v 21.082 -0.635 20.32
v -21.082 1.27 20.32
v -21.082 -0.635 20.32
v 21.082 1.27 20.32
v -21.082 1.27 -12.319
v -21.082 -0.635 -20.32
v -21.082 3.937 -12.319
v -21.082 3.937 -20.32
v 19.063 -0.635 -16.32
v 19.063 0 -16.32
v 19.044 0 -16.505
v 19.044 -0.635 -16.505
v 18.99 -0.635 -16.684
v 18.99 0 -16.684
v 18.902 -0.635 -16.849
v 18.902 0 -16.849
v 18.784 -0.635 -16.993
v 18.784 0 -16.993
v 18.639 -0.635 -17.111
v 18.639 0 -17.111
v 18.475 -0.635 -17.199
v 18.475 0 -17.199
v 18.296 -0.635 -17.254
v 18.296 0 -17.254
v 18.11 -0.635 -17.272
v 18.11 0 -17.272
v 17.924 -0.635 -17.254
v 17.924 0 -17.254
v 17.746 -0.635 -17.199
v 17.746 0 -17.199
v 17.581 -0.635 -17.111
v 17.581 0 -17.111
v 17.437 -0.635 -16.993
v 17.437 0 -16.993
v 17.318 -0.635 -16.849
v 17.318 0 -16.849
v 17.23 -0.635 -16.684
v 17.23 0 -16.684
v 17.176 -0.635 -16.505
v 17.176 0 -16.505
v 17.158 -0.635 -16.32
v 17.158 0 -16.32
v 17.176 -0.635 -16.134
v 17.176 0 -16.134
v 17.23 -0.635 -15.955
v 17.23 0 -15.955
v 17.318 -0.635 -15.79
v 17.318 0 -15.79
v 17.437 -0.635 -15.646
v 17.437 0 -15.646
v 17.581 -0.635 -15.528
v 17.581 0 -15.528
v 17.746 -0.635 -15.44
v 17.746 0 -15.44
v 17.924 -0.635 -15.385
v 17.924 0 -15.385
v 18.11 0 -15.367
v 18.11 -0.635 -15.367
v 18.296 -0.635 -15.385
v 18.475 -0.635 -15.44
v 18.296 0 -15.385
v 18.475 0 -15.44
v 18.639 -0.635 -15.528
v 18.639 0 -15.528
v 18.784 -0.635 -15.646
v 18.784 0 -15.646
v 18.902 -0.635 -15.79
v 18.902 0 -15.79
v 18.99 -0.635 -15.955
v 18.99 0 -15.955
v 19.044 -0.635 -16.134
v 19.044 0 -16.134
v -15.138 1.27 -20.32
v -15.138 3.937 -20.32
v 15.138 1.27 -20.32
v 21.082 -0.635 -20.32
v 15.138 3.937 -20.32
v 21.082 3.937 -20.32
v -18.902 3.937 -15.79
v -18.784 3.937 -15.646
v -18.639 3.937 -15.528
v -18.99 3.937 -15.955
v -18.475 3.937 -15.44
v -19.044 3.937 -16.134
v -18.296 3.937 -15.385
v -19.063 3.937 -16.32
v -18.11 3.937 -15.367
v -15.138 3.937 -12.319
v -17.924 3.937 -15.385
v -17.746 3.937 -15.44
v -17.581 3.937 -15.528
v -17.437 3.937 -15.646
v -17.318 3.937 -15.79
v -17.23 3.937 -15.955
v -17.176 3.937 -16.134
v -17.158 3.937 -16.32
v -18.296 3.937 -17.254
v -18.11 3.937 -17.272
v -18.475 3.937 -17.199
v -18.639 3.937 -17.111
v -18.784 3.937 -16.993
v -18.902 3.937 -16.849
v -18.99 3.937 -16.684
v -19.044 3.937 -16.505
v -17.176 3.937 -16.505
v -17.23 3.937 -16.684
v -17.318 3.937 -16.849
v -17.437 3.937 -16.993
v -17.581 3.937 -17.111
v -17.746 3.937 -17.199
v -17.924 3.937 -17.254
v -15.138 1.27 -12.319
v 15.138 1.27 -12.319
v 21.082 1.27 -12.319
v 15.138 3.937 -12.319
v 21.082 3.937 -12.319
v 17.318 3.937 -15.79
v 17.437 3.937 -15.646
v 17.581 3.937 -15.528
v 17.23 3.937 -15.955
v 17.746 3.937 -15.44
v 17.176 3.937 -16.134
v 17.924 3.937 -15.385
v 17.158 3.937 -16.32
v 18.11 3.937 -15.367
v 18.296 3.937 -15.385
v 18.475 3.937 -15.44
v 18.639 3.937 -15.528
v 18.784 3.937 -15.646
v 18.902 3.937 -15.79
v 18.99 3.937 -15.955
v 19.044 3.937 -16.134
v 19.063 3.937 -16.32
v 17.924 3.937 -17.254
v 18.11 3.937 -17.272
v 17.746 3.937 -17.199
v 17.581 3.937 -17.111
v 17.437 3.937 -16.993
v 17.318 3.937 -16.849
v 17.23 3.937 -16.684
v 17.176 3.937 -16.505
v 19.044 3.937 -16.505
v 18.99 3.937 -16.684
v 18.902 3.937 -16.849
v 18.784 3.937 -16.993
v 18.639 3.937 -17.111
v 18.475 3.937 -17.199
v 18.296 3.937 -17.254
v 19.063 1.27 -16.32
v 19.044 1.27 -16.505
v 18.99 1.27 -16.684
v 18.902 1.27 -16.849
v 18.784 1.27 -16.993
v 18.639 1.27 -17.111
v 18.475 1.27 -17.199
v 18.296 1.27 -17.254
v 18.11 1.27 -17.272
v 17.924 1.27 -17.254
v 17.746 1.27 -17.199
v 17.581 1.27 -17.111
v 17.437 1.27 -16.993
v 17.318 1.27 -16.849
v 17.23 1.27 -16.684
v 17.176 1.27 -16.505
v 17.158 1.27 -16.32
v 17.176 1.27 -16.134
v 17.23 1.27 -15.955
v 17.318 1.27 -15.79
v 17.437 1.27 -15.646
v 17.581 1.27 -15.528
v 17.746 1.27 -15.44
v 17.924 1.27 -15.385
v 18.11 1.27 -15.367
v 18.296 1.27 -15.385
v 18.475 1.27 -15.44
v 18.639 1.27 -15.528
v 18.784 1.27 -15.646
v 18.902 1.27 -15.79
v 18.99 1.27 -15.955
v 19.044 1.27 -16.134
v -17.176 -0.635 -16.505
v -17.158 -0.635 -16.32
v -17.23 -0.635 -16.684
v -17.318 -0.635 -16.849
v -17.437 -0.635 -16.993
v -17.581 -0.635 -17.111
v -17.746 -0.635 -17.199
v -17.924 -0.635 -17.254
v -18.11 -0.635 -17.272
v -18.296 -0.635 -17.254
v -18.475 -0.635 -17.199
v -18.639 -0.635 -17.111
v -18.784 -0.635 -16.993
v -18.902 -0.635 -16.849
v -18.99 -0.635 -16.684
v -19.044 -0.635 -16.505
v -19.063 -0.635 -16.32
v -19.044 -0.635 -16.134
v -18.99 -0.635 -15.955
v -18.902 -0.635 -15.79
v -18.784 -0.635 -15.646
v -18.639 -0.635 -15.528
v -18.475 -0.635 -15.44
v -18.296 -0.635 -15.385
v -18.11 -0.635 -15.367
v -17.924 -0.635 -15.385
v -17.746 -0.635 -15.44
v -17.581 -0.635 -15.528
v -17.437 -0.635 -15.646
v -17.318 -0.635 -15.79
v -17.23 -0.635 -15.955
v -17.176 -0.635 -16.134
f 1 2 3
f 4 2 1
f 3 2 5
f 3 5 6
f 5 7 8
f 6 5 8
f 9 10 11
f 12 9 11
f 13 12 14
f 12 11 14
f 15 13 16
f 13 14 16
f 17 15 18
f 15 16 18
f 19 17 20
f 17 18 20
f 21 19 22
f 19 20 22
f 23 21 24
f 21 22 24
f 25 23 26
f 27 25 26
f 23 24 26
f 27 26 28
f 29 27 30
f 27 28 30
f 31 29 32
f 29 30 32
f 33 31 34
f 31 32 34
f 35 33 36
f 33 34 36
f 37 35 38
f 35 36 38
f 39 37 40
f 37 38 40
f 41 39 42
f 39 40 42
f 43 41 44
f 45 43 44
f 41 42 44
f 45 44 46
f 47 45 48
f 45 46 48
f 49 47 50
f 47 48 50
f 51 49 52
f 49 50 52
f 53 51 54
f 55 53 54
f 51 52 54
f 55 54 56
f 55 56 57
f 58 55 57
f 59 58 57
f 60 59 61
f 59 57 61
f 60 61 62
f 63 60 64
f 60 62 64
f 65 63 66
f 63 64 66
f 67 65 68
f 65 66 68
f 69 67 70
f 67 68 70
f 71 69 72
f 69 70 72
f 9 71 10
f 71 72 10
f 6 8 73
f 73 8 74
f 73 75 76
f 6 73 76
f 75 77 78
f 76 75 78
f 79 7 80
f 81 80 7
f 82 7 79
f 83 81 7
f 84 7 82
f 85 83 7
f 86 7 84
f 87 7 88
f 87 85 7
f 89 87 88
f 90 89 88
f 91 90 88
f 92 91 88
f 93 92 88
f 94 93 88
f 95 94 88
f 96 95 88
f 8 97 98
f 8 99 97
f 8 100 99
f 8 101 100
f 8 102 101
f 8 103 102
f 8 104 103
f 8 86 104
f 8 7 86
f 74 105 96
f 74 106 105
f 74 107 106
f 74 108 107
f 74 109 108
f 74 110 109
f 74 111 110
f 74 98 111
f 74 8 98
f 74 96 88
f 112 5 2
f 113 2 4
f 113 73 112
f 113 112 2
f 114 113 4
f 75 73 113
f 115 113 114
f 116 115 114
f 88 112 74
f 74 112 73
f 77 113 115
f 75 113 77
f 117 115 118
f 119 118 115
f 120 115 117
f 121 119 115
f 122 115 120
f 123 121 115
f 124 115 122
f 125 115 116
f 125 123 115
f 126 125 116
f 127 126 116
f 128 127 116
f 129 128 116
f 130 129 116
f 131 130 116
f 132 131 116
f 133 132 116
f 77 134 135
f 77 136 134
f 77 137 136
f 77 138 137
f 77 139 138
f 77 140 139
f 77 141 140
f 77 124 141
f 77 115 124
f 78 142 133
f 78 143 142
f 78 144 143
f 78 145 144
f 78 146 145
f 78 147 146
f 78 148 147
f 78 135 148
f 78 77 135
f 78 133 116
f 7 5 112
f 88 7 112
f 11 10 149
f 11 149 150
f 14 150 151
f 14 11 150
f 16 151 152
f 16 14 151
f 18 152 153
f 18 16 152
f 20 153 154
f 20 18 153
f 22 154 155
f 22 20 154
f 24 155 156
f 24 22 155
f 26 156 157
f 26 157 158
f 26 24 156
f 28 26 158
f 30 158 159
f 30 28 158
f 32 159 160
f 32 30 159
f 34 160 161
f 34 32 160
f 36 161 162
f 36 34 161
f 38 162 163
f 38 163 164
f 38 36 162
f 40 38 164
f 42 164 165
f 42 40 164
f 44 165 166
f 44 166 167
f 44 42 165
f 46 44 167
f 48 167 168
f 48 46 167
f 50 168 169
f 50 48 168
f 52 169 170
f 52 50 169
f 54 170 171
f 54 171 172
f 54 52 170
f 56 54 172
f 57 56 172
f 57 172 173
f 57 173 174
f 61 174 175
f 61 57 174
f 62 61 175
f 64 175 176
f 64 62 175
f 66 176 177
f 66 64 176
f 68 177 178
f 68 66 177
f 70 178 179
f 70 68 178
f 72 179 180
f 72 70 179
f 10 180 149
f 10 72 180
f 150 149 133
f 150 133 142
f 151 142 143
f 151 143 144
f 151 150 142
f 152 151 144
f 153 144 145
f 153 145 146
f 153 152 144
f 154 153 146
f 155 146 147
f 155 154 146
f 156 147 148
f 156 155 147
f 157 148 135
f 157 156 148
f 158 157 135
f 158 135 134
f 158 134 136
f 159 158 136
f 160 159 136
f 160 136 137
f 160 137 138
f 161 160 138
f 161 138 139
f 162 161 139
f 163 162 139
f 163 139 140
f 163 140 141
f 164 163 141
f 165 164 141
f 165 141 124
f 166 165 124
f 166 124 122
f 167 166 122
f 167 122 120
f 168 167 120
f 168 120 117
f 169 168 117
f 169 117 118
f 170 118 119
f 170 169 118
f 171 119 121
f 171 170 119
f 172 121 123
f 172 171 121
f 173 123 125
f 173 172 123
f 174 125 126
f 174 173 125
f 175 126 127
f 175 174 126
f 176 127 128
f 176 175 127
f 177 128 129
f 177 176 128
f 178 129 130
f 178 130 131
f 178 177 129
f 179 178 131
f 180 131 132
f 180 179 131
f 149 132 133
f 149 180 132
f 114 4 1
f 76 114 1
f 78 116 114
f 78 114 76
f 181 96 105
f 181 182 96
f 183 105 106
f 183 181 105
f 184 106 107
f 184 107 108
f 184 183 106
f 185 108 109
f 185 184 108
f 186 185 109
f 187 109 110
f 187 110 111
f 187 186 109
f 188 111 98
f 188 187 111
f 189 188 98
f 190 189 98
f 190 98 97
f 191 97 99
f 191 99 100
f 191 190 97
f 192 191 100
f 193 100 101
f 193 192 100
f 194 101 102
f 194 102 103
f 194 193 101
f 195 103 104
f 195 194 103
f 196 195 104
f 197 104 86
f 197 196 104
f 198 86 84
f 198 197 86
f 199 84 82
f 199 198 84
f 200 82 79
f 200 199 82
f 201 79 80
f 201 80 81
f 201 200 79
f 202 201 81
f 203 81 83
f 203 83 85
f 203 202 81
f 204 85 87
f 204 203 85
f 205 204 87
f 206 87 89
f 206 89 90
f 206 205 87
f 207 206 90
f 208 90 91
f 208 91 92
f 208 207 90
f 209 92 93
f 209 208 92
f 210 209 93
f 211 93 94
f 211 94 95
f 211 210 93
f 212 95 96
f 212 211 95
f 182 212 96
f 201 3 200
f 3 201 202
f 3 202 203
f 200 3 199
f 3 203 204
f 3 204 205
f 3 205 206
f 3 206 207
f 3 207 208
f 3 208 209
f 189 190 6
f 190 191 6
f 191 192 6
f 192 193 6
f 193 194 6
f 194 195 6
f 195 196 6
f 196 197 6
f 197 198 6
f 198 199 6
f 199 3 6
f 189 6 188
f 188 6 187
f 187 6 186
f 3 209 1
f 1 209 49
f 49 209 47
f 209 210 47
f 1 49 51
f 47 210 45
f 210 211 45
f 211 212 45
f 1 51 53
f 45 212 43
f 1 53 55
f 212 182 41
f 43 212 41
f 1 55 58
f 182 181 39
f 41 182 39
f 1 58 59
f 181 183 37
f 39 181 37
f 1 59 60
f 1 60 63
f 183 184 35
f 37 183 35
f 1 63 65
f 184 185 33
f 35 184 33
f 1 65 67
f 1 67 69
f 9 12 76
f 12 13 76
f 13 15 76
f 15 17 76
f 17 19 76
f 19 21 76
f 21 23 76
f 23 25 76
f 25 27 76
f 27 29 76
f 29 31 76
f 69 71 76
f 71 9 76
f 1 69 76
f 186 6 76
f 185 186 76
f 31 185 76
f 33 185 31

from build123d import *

# Parameters (mm, degrees)
BOSS_EXTRUDE1_DEPTH      = 1.27
BOSS_EXTRUDE1_DEPTH_BACK = 0.635
SKETCH1_W                = 42.164
SKETCH1_H                = 40.64
SKETCH1_R                = 0.9525
SKETCH1_4_W              = 5.9436
SKETCH1_4_H              = 8.001
SKETCH1_4_R              = 0.9525
BOSS_EXTRUDE2_DEPTH      = 3.937


with BuildPart() as part:
    # Sketch1 → Boss-Extrude1 (new, two sides: drawn at the far end of the back side and taken through both)
    with BuildSketch(Plane(origin=(0, 0, 0), x_dir=(1, 0, 0), z_dir=(0, 1, 0)).offset(-BOSS_EXTRUDE1_DEPTH_BACK)):
        Rectangle(SKETCH1_W, SKETCH1_H)
        with Locations((18.1102, 16.3195)):
            Circle(SKETCH1_R, mode=Mode.SUBTRACT)
        with Locations((-18.1102, 16.3195)):
            Circle(SKETCH1_R, mode=Mode.SUBTRACT)
    extrude(amount=BOSS_EXTRUDE1_DEPTH + BOSS_EXTRUDE1_DEPTH_BACK)

    # Sketch1_4 → Boss-Extrude2 (add)
    # profile 1 of 2: a face of its own
    with BuildSketch(Plane(origin=(0, 0, 0), x_dir=(1, 0, 0), z_dir=(0, 1, 0))):
        with Locations((18.1102, 16.3195)):
            Rectangle(SKETCH1_4_W, SKETCH1_4_H)
        with Locations((18.1102, 16.3195)):
            Circle(SKETCH1_4_R, mode=Mode.SUBTRACT)
    # profile 2 of 2: a face of its own
    with BuildSketch(Plane(origin=(0, 0, 0), x_dir=(1, 0, 0), z_dir=(0, 1, 0))):
        with Locations((-18.1102, 16.3195)):
            Rectangle(SKETCH1_4_W, SKETCH1_4_H)
        with Locations((-18.1102, 16.3195)):
            Circle(SKETCH1_4_R, mode=Mode.SUBTRACT)
    extrude(amount=BOSS_EXTRUDE2_DEPTH)


solid = part.part
